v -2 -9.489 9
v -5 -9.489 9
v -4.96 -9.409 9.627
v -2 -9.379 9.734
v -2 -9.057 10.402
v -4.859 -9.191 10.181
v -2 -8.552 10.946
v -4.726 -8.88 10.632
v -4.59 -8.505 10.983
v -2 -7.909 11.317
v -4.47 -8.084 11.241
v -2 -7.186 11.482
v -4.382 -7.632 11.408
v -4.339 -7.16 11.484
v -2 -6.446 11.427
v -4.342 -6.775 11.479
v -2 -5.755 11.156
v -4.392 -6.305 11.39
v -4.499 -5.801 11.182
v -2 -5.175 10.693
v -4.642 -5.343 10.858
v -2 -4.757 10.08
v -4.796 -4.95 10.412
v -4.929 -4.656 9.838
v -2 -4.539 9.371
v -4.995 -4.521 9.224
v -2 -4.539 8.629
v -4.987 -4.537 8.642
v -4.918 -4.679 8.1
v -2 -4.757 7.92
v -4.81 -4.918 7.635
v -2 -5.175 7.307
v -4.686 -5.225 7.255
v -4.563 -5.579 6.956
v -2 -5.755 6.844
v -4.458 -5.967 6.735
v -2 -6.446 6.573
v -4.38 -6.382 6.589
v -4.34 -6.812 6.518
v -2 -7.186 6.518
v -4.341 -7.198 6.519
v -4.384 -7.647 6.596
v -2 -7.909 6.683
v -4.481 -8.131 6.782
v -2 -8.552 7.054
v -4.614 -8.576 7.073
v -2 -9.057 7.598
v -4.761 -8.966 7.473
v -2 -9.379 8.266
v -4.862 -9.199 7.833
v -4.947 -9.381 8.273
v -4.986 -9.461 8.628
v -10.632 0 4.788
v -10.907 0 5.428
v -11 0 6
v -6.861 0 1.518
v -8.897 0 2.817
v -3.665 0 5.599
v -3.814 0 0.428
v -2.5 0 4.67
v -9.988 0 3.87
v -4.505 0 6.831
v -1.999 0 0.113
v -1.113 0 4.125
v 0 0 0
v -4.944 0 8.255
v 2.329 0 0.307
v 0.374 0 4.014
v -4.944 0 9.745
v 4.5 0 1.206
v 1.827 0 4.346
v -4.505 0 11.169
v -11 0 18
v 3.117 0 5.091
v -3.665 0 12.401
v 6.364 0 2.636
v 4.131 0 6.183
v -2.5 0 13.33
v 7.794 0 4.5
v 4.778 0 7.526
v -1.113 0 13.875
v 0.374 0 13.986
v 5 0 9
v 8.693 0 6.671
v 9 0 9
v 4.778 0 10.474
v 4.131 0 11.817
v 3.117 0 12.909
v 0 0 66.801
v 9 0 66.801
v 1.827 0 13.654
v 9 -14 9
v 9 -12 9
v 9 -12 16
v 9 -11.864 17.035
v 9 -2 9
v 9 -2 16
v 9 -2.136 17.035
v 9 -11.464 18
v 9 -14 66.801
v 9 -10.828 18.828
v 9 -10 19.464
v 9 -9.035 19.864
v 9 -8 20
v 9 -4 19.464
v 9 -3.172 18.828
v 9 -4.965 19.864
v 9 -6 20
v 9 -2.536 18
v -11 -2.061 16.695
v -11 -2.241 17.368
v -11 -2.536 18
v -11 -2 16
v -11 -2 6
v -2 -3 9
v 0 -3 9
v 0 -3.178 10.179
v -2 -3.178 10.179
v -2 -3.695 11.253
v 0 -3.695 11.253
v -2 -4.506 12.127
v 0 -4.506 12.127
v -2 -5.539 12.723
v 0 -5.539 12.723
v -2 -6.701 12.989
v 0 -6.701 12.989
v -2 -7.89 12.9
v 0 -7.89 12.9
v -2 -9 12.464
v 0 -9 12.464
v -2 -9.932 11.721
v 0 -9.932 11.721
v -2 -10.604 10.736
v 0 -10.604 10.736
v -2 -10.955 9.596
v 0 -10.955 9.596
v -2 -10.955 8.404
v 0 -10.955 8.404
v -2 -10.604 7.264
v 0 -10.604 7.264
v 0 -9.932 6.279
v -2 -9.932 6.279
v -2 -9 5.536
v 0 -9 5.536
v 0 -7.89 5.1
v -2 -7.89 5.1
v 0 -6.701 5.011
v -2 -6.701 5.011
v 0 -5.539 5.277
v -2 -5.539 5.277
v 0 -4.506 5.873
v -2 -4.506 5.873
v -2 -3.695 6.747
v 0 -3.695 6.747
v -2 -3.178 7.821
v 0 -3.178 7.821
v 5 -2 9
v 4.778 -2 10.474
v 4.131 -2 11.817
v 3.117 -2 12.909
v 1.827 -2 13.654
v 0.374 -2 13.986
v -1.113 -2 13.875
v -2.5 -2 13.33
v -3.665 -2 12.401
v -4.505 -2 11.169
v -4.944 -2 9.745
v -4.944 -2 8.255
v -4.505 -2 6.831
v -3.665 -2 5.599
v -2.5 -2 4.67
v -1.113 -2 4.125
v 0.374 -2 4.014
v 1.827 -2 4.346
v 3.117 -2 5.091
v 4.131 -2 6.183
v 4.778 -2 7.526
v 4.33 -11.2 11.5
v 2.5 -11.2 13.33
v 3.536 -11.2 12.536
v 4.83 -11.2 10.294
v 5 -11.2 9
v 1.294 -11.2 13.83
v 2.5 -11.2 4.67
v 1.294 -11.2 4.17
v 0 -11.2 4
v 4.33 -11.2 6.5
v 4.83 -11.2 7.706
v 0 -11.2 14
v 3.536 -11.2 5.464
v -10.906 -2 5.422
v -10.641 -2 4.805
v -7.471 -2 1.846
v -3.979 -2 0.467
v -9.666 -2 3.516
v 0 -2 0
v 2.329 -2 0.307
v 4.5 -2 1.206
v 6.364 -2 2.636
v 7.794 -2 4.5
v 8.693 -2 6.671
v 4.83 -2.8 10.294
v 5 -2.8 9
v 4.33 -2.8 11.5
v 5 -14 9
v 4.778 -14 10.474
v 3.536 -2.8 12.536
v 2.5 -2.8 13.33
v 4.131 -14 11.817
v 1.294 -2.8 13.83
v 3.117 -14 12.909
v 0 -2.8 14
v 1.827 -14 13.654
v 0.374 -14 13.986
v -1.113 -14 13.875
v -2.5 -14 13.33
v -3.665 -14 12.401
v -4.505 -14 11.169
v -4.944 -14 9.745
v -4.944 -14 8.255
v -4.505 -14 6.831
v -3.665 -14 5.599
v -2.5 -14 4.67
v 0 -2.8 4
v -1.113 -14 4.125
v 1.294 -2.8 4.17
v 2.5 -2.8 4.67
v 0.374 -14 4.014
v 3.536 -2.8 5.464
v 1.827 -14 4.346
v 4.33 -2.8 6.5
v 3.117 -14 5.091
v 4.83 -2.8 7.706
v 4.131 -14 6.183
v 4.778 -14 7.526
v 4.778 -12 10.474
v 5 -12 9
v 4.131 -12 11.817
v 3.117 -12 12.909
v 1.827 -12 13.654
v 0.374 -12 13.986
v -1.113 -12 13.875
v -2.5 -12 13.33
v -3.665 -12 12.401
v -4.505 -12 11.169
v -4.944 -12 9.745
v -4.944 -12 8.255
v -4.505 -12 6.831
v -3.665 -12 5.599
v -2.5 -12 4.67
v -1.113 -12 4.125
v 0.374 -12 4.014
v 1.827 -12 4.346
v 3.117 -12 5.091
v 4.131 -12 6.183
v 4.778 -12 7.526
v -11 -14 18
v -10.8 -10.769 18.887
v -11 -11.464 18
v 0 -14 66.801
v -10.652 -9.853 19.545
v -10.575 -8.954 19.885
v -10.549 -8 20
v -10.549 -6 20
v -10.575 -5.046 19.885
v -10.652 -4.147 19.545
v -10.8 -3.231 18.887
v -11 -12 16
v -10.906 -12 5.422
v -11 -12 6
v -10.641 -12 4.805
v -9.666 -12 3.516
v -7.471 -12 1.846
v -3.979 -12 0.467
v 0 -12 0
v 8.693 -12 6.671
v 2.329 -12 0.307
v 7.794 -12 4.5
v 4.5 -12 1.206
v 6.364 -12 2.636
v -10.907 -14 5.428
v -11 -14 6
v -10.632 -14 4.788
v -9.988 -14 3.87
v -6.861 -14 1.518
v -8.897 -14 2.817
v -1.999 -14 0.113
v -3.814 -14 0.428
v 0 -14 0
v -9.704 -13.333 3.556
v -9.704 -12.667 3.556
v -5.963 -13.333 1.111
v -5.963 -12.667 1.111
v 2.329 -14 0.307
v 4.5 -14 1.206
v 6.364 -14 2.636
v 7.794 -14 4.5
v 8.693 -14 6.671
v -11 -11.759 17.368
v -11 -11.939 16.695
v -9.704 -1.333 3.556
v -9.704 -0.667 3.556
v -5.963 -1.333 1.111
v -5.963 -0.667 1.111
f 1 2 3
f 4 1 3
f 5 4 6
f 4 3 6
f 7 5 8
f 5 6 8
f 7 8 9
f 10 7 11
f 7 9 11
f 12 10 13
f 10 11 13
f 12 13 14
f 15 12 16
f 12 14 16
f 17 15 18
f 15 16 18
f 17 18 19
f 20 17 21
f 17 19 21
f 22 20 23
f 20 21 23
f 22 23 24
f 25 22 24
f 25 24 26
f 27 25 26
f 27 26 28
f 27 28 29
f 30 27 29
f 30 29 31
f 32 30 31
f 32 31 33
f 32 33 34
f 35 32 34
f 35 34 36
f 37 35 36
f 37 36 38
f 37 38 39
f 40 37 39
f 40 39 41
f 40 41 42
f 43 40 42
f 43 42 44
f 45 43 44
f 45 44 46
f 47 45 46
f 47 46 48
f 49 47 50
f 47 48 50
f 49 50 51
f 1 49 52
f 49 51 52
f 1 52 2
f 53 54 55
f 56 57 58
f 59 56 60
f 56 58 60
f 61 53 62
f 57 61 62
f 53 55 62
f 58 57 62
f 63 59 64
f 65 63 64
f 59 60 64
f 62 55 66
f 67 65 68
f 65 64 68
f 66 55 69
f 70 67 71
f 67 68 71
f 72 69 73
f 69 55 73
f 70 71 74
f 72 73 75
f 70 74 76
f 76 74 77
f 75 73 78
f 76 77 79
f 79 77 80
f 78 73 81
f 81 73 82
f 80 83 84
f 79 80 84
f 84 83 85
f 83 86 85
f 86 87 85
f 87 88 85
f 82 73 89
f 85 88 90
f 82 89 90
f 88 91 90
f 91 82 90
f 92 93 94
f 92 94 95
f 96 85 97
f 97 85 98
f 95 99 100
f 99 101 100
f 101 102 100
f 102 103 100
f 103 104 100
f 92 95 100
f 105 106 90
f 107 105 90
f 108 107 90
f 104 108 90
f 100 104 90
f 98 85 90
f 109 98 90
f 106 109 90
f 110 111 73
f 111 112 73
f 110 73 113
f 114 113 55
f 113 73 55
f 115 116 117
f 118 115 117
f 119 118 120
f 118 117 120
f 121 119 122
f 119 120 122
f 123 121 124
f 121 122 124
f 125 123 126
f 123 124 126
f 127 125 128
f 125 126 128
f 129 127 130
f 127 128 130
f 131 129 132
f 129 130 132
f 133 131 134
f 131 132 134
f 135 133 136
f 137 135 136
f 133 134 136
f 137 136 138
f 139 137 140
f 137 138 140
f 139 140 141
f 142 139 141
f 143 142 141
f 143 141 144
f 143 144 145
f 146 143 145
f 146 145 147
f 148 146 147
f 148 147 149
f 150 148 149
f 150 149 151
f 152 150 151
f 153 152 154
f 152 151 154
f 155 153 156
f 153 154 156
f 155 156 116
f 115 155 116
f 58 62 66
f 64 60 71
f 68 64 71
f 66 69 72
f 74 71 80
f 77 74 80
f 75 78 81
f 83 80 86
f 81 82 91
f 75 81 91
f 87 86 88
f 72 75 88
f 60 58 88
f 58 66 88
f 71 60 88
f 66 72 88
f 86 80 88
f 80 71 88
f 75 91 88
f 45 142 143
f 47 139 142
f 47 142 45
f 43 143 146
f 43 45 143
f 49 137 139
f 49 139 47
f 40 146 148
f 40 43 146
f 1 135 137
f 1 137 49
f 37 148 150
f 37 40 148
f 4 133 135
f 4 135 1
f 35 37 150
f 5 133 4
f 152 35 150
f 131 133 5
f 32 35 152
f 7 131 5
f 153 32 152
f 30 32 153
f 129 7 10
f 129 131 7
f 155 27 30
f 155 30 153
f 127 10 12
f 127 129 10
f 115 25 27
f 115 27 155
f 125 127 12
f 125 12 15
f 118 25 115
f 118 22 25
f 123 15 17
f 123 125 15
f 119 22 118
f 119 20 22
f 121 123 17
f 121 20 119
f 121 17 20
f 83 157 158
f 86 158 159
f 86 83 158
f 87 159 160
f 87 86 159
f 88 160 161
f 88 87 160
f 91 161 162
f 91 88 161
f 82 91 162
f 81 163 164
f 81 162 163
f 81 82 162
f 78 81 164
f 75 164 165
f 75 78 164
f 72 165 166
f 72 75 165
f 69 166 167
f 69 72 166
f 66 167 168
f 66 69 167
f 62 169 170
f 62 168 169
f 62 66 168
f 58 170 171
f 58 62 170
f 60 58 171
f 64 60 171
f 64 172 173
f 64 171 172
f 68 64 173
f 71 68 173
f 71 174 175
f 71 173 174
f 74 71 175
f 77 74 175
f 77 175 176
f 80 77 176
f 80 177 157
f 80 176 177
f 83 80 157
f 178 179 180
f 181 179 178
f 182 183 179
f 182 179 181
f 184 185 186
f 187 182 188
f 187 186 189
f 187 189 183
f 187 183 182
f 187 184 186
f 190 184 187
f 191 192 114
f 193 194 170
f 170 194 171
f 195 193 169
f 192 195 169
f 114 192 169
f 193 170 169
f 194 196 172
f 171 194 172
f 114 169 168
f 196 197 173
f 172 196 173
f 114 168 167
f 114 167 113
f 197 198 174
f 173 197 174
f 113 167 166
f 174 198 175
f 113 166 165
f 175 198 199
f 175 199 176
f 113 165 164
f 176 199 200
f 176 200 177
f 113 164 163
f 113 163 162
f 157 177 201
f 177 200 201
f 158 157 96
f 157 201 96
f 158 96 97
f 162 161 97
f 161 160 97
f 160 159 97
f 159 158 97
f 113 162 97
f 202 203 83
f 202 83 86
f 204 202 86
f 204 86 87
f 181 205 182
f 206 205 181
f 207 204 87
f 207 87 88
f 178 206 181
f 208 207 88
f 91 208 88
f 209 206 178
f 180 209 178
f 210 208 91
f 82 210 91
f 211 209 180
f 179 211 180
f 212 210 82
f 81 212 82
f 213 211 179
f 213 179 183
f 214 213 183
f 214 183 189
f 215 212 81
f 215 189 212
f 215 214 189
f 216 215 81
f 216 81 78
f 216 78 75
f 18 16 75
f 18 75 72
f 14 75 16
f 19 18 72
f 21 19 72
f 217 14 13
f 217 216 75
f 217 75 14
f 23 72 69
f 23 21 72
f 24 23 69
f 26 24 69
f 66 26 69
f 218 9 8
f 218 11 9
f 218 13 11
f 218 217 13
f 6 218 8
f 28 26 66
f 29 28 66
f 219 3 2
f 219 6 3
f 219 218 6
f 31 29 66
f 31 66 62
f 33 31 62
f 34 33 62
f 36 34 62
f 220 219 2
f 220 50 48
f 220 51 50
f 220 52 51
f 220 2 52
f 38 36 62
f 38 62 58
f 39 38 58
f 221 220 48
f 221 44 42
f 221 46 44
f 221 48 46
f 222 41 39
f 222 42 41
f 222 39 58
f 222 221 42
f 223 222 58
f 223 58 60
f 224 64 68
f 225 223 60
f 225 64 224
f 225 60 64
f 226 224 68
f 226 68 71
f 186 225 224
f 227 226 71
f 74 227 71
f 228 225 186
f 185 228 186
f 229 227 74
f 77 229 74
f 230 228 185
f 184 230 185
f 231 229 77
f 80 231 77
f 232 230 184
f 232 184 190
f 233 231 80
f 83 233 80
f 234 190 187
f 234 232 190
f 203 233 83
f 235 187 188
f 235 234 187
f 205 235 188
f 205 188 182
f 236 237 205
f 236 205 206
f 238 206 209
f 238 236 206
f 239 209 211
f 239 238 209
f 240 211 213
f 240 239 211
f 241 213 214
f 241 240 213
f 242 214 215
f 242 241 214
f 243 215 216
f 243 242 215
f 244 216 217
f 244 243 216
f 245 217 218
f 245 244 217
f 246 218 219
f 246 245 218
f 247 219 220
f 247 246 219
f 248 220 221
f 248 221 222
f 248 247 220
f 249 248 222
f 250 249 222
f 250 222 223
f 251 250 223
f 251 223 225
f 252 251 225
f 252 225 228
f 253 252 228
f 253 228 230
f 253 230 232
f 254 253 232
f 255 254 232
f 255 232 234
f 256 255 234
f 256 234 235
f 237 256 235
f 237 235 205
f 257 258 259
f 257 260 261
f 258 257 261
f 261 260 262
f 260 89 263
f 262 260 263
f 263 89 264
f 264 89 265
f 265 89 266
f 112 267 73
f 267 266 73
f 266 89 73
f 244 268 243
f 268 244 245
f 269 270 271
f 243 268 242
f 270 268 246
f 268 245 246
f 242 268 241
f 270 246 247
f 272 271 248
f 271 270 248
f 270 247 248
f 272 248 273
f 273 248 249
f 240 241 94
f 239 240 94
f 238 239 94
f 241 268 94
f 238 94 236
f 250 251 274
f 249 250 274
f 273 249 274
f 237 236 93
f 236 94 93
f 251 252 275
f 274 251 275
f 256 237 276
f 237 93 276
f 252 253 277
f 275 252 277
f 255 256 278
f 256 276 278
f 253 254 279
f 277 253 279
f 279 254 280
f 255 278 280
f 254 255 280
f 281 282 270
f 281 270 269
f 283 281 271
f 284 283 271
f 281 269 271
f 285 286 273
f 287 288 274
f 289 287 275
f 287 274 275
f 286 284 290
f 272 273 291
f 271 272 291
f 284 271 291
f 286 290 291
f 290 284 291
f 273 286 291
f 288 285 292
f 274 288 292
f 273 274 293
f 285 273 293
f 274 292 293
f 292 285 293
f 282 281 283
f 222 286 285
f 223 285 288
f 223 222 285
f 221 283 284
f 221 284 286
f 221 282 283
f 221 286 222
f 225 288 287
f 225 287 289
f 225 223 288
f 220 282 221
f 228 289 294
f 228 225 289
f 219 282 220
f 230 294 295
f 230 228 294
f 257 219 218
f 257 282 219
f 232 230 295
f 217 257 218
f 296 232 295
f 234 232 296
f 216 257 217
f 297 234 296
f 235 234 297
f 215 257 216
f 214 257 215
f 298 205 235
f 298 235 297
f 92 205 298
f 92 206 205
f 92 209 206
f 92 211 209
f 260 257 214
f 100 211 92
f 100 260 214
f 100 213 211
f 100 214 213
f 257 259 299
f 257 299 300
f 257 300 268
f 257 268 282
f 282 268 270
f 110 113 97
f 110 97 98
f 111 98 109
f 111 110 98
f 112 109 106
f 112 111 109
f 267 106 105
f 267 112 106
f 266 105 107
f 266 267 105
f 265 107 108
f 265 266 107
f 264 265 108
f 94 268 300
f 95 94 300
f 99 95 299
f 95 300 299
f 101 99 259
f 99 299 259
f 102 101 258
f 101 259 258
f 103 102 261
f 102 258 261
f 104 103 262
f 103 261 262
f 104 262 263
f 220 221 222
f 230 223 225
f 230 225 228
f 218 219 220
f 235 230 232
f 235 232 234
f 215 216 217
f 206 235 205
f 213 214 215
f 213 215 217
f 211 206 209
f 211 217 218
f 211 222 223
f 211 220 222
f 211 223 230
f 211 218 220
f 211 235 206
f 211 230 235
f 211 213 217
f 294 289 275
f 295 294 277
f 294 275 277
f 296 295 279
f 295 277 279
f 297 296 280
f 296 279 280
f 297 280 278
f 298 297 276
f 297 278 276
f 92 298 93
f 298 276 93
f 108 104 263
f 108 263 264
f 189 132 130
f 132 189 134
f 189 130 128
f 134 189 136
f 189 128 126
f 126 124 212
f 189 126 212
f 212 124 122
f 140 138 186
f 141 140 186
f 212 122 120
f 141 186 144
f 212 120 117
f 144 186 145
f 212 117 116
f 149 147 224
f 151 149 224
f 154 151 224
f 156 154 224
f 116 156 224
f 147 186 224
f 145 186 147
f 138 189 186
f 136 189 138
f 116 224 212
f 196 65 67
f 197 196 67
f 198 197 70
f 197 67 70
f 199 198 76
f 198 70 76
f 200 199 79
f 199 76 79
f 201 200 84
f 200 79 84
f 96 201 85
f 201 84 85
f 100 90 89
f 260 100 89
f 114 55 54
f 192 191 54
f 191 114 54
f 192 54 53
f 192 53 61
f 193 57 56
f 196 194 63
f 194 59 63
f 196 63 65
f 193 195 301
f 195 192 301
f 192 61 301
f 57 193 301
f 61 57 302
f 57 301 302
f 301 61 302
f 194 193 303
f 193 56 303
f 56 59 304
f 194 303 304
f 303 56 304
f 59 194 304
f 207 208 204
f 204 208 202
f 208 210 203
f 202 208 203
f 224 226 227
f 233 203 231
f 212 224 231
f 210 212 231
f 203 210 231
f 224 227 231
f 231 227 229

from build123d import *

# Parameters (mm, degrees)
F0_R      = 5
F1_DEPTH  = 14
F2_W      = 10
F2_H      = 9
F2_H_2    = 11
F3_DEPTH  = 25
F5_R      = 5
F6_DEPTH  = 14
F7_W      = 5
F7_H      = 8.4
F8_DEPTH  = 66.8020807441
F10_D     = 4.9784
F9_R      = 4
F11_DEPTH = 2
F12_R     = 4


with BuildPart() as f1:
    # F0 (on Front) → F1 (new body)
    with BuildSketch(Plane.XZ):
        with BuildLine():
            ThreePointArc((0, 0), (6.3639610307, 2.6360389693), (9, 9))
            Line((9, 9), (9, 66.8010806441))
            Line((9, 66.8010806441), (0, 66.8010806441))
            Line((0, 66.8010806441), (-11, 18))
            Line((-11, 18), (-11, 6))
            add(Edge.make_bspline(
                [(-11, 6), (-11, 4), (-7, 0), (0, 0)],
                knots=[0, 0, 0, 0, 12.5299640861, 12.5299640861, 12.5299640861, 12.5299640861], degree=3))
        make_face()
        with Locations((0, 9)):
            Circle(F0_R, mode=Mode.SUBTRACT)
    extrude(amount=F1_DEPTH)

    # F2 (on face) → F3 (cut)
    with BuildSketch(Plane.YZ.offset(9)):
        with Locations((-7, 4.5)):
            Rectangle(F2_W, F2_H)
        with Locations((-7, 14.5)):
            Rectangle(F2_W, F2_H_2)
    extrude(amount=-F3_DEPTH, mode=Mode.SUBTRACT)

    # F12
    f12_edges = [f1.edges().sort_by_distance(p)[0] for p in [
        (-0.774595, -12, 20),
        (-0.774595, -2, 20),
    ]]
    fillet(f12_edges, radius=F12_R)


with BuildPart() as f6:
    # F5 (on face) → F6 (new body, through all)
    with BuildSketch(Plane.XZ.offset(14)):
        with Locations((0, 9)):
            Circle(F5_R)
    extrude(amount=-F6_DEPTH)

    # F7 (on Top) → F8 (cut, through all)
    with BuildSketch(Plane.XY):
        with Locations((2.5, -7)):
            Rectangle(F7_W, F7_H)
    extrude(amount=F8_DEPTH, mode=Mode.SUBTRACT)

    # F10 (through all)
    with Locations(Plane.YZ):
        with Locations((-7, 9)):
            Hole(F10_D / 2)

    # F9 (on face) → F11 (cut)
    with BuildSketch(Plane.YZ):
        with Locations((-7, 9)):
            Circle(F9_R)
    extrude(amount=-F11_DEPTH, mode=Mode.SUBTRACT)


solid = Compound([f1.part, f6.part])
